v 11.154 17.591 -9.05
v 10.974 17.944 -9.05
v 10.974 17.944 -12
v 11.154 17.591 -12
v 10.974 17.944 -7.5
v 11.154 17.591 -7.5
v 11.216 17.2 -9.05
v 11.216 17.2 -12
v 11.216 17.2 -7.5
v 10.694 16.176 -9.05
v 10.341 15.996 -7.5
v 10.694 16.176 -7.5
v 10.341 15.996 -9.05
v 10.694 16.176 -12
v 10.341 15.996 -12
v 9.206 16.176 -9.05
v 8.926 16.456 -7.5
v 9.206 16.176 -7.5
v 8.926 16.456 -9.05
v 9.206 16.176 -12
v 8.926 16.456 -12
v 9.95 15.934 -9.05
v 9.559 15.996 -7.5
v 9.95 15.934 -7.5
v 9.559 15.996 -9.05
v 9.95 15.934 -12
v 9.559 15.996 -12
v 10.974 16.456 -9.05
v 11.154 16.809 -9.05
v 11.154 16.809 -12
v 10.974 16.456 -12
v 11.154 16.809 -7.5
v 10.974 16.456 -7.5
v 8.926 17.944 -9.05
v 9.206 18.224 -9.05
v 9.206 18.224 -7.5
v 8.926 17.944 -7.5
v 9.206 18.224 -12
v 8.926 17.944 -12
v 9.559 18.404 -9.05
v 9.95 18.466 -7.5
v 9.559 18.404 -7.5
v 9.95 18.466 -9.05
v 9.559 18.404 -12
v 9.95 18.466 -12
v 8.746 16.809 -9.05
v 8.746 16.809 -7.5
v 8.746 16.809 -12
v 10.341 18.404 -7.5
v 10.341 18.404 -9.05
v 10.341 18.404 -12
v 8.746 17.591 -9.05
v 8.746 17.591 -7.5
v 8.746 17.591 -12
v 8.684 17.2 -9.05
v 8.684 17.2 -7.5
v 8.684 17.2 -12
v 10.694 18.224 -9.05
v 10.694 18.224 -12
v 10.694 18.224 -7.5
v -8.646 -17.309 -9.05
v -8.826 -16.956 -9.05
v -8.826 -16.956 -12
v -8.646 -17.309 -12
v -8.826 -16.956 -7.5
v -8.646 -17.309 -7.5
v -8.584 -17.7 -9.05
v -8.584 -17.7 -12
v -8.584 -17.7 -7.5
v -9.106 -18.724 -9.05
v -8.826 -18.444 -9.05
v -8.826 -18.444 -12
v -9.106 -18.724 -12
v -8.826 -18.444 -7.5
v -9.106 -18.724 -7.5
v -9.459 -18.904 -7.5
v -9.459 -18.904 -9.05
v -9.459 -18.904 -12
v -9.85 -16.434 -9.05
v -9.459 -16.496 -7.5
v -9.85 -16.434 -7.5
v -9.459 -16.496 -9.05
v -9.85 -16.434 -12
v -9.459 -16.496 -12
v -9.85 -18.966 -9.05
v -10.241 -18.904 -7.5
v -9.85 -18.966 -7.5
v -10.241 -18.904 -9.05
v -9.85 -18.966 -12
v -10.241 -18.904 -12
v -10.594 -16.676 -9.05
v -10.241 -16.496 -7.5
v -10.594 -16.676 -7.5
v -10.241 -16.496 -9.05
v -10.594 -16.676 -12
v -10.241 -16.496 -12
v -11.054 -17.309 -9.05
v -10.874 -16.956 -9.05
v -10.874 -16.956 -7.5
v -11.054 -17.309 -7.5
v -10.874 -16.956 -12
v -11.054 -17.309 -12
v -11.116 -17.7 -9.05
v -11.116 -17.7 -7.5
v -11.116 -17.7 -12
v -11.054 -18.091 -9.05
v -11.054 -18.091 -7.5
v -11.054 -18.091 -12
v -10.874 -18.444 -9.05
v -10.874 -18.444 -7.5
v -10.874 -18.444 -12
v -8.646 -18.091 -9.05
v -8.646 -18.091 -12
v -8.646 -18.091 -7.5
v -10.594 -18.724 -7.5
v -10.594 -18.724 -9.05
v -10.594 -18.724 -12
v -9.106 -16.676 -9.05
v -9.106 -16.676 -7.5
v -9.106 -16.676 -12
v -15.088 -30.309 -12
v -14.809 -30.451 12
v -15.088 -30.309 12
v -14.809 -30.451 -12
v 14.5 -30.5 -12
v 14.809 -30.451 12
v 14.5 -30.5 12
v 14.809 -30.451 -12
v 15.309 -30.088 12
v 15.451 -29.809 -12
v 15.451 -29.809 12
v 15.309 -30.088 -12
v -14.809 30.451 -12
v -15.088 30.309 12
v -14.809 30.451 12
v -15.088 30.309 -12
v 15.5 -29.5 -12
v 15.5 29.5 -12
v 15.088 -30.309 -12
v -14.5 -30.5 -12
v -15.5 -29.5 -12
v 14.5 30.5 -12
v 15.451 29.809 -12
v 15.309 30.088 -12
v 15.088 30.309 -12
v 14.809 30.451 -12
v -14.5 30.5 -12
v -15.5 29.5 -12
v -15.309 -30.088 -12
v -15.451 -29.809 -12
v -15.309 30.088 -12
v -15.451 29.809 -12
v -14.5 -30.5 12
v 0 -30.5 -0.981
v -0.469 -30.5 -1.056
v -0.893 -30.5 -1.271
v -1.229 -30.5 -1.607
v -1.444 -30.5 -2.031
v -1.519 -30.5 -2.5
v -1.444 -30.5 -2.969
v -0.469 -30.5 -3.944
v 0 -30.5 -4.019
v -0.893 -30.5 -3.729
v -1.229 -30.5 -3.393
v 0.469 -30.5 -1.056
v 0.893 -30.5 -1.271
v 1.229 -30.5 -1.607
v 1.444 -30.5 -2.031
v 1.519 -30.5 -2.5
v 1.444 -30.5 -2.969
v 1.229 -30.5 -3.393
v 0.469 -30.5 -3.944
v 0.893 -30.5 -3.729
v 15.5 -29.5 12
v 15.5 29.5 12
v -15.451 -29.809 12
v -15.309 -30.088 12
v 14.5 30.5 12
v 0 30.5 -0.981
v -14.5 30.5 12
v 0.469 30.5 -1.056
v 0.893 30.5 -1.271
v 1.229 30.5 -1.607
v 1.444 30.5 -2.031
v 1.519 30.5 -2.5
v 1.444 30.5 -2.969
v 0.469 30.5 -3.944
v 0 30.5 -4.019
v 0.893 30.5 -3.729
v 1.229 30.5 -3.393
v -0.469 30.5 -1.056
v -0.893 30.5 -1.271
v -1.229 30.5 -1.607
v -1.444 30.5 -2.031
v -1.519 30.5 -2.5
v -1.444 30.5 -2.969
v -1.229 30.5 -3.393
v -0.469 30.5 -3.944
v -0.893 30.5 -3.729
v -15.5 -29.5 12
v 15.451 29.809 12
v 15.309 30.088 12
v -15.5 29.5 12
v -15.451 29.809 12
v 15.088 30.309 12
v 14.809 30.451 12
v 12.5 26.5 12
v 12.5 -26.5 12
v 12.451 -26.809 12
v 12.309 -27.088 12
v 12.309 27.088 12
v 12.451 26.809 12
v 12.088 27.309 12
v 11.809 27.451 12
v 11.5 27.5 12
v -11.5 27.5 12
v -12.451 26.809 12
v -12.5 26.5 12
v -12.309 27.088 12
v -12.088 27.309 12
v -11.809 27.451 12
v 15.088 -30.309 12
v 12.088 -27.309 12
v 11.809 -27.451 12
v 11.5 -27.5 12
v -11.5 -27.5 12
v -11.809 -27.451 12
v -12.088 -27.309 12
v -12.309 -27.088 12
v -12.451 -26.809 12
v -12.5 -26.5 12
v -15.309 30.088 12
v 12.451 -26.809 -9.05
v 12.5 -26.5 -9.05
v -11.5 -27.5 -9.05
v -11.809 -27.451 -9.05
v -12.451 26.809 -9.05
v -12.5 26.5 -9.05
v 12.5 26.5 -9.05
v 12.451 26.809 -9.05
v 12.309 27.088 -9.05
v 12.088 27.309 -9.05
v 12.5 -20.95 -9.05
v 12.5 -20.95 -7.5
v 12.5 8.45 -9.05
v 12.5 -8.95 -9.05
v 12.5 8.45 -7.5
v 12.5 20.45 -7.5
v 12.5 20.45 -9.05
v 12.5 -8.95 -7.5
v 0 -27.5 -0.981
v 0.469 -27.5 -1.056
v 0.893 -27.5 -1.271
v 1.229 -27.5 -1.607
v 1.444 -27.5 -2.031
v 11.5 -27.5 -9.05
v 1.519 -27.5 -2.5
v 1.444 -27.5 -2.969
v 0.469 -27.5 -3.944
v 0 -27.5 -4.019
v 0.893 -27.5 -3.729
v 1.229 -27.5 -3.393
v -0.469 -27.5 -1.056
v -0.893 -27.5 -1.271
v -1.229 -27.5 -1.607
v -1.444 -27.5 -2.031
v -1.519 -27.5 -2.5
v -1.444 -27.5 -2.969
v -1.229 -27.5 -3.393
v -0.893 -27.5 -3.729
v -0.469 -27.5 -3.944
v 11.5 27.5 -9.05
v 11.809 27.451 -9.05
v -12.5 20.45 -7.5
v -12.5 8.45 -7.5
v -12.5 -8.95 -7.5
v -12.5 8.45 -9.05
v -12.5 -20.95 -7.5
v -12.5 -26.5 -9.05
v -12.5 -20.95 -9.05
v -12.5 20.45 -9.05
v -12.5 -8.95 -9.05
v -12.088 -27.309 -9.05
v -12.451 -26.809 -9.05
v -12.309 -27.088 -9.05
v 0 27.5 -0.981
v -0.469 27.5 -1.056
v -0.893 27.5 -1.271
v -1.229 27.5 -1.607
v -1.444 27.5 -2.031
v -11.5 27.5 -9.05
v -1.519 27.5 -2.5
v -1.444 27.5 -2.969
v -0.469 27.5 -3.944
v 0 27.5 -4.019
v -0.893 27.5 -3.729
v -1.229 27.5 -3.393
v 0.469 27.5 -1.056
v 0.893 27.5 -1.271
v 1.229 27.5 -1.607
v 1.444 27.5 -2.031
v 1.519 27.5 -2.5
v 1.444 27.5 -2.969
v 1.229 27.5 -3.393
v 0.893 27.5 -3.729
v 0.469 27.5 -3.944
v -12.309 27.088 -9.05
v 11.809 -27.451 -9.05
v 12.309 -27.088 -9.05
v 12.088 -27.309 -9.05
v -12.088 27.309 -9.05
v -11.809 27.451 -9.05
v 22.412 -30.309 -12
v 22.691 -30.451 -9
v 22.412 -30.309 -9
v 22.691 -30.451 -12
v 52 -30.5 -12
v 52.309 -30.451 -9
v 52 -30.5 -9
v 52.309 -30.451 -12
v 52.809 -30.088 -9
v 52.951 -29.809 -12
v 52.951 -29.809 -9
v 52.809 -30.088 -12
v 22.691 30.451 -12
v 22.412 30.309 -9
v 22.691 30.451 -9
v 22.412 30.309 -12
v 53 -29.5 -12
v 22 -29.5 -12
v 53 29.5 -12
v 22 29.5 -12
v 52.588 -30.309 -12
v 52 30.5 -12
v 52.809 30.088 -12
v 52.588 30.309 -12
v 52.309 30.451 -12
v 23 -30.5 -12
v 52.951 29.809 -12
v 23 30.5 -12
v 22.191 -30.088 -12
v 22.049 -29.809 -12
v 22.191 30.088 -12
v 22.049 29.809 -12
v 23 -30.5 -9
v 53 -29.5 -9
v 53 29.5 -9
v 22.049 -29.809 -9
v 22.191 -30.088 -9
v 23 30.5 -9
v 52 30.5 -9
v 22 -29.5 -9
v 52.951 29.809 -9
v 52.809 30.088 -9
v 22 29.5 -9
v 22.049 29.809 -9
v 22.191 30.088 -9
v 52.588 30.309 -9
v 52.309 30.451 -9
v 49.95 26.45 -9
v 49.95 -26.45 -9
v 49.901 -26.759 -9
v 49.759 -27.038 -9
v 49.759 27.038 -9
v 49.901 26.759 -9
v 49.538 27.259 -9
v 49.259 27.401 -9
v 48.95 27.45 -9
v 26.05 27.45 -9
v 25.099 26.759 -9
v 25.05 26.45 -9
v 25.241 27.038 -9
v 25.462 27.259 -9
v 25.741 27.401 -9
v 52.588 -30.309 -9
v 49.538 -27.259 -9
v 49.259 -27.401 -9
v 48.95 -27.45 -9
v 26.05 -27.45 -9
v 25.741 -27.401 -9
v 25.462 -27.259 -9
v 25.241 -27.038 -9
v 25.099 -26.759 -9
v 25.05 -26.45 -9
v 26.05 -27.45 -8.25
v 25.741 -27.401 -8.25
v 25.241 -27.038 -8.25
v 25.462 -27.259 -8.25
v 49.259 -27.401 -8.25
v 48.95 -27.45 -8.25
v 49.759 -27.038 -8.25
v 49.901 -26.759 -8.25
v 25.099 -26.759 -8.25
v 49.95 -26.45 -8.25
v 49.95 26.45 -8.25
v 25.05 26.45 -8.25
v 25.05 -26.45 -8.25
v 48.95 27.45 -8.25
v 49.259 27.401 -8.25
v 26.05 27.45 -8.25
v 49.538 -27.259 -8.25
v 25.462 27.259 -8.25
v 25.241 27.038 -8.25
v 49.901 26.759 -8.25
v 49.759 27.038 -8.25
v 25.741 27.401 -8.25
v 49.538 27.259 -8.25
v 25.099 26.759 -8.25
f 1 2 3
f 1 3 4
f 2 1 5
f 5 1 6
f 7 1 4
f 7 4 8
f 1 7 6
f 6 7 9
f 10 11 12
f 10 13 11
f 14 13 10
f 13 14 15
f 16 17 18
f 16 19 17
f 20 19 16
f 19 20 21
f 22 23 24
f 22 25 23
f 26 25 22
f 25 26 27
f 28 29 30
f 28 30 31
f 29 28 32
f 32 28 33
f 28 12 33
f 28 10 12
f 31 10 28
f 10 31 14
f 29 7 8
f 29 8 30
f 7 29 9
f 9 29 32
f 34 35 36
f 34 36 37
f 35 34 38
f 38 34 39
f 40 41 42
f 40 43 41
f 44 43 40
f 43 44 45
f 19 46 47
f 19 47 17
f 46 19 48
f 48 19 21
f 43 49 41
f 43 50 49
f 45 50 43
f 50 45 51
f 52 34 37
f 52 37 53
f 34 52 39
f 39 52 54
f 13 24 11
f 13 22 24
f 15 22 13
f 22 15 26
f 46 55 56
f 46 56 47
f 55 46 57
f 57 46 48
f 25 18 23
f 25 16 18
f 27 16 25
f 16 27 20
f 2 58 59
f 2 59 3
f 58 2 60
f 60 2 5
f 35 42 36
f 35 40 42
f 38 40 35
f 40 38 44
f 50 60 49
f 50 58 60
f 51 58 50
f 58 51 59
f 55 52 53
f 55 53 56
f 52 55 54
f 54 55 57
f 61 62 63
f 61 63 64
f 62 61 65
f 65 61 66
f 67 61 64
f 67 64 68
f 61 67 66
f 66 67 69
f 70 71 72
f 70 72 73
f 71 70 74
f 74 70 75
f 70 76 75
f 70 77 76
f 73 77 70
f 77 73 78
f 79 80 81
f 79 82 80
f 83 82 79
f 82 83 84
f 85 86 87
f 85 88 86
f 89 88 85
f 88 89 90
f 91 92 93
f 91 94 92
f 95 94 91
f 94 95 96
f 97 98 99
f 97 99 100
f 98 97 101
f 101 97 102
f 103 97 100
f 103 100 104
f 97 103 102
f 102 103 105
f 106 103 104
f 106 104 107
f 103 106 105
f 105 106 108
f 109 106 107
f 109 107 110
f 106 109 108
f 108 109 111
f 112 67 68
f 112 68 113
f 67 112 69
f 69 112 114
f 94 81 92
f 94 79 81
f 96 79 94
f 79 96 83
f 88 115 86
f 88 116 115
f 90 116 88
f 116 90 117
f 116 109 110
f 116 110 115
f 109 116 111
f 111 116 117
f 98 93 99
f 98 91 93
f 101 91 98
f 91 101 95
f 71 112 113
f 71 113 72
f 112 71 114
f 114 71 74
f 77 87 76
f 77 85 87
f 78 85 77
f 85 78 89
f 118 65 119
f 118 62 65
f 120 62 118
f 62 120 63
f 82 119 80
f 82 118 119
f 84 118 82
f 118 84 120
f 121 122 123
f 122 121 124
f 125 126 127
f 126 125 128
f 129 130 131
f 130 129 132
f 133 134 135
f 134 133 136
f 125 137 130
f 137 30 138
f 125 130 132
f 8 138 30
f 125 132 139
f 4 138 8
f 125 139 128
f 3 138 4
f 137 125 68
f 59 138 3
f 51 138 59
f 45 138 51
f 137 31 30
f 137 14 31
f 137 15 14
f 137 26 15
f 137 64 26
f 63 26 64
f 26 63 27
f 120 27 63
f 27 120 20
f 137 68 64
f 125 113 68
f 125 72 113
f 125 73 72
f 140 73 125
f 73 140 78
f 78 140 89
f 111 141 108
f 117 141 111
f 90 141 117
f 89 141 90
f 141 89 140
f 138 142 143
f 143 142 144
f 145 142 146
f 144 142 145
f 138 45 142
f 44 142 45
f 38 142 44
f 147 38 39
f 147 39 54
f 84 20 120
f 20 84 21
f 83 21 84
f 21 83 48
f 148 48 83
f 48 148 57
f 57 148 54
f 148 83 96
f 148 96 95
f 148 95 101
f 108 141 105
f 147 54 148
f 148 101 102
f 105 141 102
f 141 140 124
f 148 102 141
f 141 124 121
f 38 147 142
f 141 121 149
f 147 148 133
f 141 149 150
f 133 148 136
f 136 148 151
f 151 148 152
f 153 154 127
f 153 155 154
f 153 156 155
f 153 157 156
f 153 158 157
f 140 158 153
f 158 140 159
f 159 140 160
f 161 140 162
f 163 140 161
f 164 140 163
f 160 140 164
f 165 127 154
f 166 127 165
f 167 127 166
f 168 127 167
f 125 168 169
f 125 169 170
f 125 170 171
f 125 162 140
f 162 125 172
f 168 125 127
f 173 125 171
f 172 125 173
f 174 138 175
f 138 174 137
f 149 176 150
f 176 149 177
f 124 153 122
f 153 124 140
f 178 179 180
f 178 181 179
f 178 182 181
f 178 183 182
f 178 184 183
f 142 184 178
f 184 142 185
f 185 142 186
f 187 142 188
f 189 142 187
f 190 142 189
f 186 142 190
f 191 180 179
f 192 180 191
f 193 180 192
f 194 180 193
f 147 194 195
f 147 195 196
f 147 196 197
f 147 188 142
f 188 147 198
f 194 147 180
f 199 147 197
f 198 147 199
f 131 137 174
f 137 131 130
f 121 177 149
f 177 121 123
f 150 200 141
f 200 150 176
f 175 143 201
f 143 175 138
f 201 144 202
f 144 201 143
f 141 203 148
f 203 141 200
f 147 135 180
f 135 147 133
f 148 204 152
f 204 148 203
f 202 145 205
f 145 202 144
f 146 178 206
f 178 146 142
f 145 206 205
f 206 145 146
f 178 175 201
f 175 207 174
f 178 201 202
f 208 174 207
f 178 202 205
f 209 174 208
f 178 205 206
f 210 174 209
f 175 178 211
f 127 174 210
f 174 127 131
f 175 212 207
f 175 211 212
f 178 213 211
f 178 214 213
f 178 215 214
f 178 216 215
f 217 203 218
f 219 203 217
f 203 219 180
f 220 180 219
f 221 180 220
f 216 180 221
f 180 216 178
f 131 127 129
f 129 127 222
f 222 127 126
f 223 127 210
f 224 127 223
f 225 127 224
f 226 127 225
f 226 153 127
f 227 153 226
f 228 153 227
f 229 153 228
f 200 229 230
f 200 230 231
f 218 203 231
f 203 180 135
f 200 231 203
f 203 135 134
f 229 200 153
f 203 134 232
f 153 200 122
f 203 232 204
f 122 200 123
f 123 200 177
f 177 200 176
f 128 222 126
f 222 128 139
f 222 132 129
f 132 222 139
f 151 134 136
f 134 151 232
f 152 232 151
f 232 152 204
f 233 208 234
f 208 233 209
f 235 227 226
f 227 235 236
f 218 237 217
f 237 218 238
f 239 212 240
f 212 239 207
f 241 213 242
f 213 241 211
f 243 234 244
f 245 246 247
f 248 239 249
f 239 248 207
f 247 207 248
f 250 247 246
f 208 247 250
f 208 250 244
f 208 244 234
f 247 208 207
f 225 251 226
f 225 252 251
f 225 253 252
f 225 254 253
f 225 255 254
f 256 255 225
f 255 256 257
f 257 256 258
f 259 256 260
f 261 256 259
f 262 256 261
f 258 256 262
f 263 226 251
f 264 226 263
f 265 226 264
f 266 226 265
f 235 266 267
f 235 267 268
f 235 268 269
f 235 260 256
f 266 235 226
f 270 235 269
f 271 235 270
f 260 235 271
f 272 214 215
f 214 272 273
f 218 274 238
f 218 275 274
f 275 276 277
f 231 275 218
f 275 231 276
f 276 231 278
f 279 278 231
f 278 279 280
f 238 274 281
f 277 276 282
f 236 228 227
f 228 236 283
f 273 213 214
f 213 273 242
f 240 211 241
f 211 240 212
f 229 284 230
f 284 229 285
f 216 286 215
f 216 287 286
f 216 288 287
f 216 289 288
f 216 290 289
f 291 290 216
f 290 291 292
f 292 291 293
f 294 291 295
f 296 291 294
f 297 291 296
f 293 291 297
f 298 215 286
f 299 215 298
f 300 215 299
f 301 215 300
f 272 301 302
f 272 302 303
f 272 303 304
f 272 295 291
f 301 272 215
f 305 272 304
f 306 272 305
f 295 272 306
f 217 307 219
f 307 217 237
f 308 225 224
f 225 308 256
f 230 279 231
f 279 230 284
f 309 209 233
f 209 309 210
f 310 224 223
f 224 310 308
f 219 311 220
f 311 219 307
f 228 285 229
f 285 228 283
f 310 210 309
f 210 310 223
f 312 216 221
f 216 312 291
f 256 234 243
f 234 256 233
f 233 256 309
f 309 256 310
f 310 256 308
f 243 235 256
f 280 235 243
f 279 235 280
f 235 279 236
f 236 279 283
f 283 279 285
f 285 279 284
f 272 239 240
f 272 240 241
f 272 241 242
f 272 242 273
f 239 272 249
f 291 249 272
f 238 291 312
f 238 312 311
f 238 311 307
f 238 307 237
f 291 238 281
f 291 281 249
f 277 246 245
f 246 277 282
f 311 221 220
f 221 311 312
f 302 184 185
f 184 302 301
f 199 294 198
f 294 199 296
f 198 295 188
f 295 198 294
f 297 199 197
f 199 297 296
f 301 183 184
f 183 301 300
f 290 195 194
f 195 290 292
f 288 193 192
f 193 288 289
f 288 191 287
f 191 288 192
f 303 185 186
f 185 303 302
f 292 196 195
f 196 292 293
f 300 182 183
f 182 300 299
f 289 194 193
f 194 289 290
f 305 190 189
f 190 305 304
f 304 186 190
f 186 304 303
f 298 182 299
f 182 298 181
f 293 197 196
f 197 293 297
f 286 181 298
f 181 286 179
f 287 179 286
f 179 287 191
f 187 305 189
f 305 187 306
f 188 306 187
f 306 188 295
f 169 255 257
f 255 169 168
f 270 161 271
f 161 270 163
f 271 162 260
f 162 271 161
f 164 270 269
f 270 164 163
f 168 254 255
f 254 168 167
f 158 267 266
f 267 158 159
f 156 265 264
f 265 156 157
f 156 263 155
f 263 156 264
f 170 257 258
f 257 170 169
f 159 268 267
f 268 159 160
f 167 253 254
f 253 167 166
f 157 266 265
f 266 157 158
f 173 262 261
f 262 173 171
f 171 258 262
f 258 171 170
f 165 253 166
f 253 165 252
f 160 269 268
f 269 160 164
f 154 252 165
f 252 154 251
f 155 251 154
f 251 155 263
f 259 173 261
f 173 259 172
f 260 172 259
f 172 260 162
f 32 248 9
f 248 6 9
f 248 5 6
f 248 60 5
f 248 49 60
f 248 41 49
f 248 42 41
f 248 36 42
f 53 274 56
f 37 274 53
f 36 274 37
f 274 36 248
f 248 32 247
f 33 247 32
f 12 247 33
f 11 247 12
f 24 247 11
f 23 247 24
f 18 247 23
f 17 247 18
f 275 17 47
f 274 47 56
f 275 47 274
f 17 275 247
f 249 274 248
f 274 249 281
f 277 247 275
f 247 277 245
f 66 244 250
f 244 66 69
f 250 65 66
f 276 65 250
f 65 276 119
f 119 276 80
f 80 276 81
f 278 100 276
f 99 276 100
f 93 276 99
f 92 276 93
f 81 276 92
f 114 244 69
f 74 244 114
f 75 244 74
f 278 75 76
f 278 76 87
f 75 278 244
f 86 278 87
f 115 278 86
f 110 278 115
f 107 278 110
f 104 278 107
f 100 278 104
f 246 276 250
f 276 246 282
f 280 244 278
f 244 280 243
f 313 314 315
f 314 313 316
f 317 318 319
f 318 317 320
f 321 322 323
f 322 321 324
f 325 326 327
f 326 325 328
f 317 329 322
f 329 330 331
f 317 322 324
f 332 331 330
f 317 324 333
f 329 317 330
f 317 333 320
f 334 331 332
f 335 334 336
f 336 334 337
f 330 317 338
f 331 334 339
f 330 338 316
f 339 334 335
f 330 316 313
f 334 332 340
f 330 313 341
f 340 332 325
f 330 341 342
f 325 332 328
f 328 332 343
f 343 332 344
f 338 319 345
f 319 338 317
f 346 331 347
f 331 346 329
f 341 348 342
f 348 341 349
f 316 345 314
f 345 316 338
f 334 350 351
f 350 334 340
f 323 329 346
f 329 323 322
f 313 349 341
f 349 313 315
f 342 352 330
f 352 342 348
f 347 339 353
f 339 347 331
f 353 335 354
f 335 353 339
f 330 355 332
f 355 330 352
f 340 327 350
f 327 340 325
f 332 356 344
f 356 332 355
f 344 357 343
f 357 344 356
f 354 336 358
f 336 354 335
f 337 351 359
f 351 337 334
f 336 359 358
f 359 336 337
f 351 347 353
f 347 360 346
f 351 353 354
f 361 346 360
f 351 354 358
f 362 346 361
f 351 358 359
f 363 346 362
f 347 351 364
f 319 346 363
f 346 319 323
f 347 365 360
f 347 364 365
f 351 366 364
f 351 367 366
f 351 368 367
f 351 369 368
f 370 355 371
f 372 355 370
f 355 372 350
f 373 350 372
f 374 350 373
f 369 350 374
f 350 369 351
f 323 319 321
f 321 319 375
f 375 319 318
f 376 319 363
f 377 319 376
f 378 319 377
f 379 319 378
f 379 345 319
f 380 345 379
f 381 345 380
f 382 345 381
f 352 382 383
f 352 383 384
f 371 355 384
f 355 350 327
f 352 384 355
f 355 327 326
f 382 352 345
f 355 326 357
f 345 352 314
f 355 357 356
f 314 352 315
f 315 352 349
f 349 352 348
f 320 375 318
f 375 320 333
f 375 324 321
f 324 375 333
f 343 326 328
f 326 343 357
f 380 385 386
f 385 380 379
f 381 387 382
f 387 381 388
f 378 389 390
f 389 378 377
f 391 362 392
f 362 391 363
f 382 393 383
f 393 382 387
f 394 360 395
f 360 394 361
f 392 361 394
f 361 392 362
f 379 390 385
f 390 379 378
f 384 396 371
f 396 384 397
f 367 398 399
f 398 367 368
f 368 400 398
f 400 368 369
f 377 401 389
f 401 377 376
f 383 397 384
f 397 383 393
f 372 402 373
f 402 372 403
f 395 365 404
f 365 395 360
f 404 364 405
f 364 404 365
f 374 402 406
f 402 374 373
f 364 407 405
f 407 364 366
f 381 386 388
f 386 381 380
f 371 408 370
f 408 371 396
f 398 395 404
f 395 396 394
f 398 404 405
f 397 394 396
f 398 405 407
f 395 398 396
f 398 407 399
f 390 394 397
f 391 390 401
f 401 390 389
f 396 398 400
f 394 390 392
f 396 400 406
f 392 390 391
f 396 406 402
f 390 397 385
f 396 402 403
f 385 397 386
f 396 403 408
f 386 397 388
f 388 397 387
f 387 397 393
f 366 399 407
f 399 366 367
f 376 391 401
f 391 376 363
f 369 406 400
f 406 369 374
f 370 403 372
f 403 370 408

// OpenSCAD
// Customizable Stepdown Converter Case
// Copyright: Olle Wreede 2020
// License: CC BY-SA

//CUSTOMIZER VARIABLES

/* [Base values] */

// Inner height in mm of case
height_of_case = 18; // [15:30]

// Inner width in mm of case
width_of_case = 25; // [15:35]

// Inner length in mm of case
length_of_case = 55; // [30:100]

// Thickness in mm of case walls
wall_thickness = 3; // [1:0.5:5]

// Corner radius in mm of case
corner_radius_of_case = 1; // [0:0.1:3]

// Diameter in mm of mount screw holes
mount_hole_diameter = 2.5; // [0:None, 2.5:M2.5, 3:M3, 4:M4]

//CUSTOMIZER VARIABLES END

/* [Hidden] */

$fn=20;
fudge = 0.1;
right_hole_ypos = 17.2;
left_hole_ypos = -17.7;

// TODO: Add extrusion mount
// TODO: Add lid latches

/* Helper modules */

module cylinder_outer(diameter, height, fn) {
   fudge = 1 / cos(180 / fn);
   cylinder(h=height, r=diameter / 2 * fudge, $fn=fn, center=true);
}

module cube_rounded(width, length, height, radius=1) {
	minkowski() {
		cube([width - 2 * radius, length - 2 * radius, height/2], center = true);
		cylinder(r = radius, h = height/2, center = true);
	}
}

/* Model */

module mount_holes(diameter, depth, width, height) {
    translate([9.95, right_hole_ypos, -height/2 - depth/2])
    cylinder_outer(diameter, depth + fudge, $fn);

    translate([-9.85, left_hole_ypos, -height/2 - depth/2])
    cylinder_outer(diameter, depth + fudge, $fn);
}

module raised_bottom(width, length, height, thickness, hole_diameter) {
    raised_bottom_zpos = -height / 2 + thickness / 2;
    difference() {
        union() {
            raised_bottom_length = 7.5 + hole_diameter + 2;
            translate([
                0,
                right_hole_ypos + hole_diameter/2 + 2 - raised_bottom_length / 2,
                raised_bottom_zpos])
            cube([width, 9.5 + hole_diameter, thickness], center=true);
            
            translate([
                0,
                left_hole_ypos - hole_diameter/2 - 2 + raised_bottom_length / 2,
                raised_bottom_zpos])
            cube([width, 9.5 + hole_diameter, thickness], center=true);
        }
        
        translate([0, 0, thickness])
        mount_holes(hole_diameter, thickness, width, height);
    }
}

module lid(width, length, thickness, corner_radius) {
    cube_rounded(
        width + thickness * 2,
        length + thickness * 2,
        thickness,
        corner_radius);
    translate([0, 0, thickness / 2])
    cube_rounded(
        width - fudge,
        length - fudge,
        thickness / 2,
        corner_radius);
}

module case(width, length, height, thickness, corner_radius, hole_diameter) {
    difference() {
        cube_rounded(
            width + thickness * 2,
            length + thickness * 2,
            height + thickness,
            corner_radius);

        translate([0, 0, thickness / 2])
        cube_rounded(
            width,
            length,
            height + fudge,
            corner_radius);
   
        translate([0, 0, thickness / 2])
        mount_holes(hole_diameter, thickness, width, height);
        
        // Cable holes
        translate([0, length / 2 + thickness / 2, - height / 2 + 5 + thickness])
        rotate([0, 90, 90])
        cylinder_outer(3, thickness + fudge, $fn);
        translate([0, -length / 2 - thickness / 2, - height / 2 + 5 + thickness])
        rotate([0, 90, 90])
        cylinder_outer(3, thickness + fudge, $fn);
    }
    
    raised_bottom(width, length, height, thickness, hole_diameter);
}

case(
    width_of_case,
    length_of_case,
    height_of_case + wall_thickness,
    wall_thickness,
    corner_radius_of_case,
    mount_hole_diameter);

translate([
    width_of_case * 1.5,
    0,
    - (height_of_case + wall_thickness * 2) / 2 + wall_thickness / 2])
lid(
    width_of_case,
    length_of_case,
    wall_thickness,
    corner_radius_of_case);
